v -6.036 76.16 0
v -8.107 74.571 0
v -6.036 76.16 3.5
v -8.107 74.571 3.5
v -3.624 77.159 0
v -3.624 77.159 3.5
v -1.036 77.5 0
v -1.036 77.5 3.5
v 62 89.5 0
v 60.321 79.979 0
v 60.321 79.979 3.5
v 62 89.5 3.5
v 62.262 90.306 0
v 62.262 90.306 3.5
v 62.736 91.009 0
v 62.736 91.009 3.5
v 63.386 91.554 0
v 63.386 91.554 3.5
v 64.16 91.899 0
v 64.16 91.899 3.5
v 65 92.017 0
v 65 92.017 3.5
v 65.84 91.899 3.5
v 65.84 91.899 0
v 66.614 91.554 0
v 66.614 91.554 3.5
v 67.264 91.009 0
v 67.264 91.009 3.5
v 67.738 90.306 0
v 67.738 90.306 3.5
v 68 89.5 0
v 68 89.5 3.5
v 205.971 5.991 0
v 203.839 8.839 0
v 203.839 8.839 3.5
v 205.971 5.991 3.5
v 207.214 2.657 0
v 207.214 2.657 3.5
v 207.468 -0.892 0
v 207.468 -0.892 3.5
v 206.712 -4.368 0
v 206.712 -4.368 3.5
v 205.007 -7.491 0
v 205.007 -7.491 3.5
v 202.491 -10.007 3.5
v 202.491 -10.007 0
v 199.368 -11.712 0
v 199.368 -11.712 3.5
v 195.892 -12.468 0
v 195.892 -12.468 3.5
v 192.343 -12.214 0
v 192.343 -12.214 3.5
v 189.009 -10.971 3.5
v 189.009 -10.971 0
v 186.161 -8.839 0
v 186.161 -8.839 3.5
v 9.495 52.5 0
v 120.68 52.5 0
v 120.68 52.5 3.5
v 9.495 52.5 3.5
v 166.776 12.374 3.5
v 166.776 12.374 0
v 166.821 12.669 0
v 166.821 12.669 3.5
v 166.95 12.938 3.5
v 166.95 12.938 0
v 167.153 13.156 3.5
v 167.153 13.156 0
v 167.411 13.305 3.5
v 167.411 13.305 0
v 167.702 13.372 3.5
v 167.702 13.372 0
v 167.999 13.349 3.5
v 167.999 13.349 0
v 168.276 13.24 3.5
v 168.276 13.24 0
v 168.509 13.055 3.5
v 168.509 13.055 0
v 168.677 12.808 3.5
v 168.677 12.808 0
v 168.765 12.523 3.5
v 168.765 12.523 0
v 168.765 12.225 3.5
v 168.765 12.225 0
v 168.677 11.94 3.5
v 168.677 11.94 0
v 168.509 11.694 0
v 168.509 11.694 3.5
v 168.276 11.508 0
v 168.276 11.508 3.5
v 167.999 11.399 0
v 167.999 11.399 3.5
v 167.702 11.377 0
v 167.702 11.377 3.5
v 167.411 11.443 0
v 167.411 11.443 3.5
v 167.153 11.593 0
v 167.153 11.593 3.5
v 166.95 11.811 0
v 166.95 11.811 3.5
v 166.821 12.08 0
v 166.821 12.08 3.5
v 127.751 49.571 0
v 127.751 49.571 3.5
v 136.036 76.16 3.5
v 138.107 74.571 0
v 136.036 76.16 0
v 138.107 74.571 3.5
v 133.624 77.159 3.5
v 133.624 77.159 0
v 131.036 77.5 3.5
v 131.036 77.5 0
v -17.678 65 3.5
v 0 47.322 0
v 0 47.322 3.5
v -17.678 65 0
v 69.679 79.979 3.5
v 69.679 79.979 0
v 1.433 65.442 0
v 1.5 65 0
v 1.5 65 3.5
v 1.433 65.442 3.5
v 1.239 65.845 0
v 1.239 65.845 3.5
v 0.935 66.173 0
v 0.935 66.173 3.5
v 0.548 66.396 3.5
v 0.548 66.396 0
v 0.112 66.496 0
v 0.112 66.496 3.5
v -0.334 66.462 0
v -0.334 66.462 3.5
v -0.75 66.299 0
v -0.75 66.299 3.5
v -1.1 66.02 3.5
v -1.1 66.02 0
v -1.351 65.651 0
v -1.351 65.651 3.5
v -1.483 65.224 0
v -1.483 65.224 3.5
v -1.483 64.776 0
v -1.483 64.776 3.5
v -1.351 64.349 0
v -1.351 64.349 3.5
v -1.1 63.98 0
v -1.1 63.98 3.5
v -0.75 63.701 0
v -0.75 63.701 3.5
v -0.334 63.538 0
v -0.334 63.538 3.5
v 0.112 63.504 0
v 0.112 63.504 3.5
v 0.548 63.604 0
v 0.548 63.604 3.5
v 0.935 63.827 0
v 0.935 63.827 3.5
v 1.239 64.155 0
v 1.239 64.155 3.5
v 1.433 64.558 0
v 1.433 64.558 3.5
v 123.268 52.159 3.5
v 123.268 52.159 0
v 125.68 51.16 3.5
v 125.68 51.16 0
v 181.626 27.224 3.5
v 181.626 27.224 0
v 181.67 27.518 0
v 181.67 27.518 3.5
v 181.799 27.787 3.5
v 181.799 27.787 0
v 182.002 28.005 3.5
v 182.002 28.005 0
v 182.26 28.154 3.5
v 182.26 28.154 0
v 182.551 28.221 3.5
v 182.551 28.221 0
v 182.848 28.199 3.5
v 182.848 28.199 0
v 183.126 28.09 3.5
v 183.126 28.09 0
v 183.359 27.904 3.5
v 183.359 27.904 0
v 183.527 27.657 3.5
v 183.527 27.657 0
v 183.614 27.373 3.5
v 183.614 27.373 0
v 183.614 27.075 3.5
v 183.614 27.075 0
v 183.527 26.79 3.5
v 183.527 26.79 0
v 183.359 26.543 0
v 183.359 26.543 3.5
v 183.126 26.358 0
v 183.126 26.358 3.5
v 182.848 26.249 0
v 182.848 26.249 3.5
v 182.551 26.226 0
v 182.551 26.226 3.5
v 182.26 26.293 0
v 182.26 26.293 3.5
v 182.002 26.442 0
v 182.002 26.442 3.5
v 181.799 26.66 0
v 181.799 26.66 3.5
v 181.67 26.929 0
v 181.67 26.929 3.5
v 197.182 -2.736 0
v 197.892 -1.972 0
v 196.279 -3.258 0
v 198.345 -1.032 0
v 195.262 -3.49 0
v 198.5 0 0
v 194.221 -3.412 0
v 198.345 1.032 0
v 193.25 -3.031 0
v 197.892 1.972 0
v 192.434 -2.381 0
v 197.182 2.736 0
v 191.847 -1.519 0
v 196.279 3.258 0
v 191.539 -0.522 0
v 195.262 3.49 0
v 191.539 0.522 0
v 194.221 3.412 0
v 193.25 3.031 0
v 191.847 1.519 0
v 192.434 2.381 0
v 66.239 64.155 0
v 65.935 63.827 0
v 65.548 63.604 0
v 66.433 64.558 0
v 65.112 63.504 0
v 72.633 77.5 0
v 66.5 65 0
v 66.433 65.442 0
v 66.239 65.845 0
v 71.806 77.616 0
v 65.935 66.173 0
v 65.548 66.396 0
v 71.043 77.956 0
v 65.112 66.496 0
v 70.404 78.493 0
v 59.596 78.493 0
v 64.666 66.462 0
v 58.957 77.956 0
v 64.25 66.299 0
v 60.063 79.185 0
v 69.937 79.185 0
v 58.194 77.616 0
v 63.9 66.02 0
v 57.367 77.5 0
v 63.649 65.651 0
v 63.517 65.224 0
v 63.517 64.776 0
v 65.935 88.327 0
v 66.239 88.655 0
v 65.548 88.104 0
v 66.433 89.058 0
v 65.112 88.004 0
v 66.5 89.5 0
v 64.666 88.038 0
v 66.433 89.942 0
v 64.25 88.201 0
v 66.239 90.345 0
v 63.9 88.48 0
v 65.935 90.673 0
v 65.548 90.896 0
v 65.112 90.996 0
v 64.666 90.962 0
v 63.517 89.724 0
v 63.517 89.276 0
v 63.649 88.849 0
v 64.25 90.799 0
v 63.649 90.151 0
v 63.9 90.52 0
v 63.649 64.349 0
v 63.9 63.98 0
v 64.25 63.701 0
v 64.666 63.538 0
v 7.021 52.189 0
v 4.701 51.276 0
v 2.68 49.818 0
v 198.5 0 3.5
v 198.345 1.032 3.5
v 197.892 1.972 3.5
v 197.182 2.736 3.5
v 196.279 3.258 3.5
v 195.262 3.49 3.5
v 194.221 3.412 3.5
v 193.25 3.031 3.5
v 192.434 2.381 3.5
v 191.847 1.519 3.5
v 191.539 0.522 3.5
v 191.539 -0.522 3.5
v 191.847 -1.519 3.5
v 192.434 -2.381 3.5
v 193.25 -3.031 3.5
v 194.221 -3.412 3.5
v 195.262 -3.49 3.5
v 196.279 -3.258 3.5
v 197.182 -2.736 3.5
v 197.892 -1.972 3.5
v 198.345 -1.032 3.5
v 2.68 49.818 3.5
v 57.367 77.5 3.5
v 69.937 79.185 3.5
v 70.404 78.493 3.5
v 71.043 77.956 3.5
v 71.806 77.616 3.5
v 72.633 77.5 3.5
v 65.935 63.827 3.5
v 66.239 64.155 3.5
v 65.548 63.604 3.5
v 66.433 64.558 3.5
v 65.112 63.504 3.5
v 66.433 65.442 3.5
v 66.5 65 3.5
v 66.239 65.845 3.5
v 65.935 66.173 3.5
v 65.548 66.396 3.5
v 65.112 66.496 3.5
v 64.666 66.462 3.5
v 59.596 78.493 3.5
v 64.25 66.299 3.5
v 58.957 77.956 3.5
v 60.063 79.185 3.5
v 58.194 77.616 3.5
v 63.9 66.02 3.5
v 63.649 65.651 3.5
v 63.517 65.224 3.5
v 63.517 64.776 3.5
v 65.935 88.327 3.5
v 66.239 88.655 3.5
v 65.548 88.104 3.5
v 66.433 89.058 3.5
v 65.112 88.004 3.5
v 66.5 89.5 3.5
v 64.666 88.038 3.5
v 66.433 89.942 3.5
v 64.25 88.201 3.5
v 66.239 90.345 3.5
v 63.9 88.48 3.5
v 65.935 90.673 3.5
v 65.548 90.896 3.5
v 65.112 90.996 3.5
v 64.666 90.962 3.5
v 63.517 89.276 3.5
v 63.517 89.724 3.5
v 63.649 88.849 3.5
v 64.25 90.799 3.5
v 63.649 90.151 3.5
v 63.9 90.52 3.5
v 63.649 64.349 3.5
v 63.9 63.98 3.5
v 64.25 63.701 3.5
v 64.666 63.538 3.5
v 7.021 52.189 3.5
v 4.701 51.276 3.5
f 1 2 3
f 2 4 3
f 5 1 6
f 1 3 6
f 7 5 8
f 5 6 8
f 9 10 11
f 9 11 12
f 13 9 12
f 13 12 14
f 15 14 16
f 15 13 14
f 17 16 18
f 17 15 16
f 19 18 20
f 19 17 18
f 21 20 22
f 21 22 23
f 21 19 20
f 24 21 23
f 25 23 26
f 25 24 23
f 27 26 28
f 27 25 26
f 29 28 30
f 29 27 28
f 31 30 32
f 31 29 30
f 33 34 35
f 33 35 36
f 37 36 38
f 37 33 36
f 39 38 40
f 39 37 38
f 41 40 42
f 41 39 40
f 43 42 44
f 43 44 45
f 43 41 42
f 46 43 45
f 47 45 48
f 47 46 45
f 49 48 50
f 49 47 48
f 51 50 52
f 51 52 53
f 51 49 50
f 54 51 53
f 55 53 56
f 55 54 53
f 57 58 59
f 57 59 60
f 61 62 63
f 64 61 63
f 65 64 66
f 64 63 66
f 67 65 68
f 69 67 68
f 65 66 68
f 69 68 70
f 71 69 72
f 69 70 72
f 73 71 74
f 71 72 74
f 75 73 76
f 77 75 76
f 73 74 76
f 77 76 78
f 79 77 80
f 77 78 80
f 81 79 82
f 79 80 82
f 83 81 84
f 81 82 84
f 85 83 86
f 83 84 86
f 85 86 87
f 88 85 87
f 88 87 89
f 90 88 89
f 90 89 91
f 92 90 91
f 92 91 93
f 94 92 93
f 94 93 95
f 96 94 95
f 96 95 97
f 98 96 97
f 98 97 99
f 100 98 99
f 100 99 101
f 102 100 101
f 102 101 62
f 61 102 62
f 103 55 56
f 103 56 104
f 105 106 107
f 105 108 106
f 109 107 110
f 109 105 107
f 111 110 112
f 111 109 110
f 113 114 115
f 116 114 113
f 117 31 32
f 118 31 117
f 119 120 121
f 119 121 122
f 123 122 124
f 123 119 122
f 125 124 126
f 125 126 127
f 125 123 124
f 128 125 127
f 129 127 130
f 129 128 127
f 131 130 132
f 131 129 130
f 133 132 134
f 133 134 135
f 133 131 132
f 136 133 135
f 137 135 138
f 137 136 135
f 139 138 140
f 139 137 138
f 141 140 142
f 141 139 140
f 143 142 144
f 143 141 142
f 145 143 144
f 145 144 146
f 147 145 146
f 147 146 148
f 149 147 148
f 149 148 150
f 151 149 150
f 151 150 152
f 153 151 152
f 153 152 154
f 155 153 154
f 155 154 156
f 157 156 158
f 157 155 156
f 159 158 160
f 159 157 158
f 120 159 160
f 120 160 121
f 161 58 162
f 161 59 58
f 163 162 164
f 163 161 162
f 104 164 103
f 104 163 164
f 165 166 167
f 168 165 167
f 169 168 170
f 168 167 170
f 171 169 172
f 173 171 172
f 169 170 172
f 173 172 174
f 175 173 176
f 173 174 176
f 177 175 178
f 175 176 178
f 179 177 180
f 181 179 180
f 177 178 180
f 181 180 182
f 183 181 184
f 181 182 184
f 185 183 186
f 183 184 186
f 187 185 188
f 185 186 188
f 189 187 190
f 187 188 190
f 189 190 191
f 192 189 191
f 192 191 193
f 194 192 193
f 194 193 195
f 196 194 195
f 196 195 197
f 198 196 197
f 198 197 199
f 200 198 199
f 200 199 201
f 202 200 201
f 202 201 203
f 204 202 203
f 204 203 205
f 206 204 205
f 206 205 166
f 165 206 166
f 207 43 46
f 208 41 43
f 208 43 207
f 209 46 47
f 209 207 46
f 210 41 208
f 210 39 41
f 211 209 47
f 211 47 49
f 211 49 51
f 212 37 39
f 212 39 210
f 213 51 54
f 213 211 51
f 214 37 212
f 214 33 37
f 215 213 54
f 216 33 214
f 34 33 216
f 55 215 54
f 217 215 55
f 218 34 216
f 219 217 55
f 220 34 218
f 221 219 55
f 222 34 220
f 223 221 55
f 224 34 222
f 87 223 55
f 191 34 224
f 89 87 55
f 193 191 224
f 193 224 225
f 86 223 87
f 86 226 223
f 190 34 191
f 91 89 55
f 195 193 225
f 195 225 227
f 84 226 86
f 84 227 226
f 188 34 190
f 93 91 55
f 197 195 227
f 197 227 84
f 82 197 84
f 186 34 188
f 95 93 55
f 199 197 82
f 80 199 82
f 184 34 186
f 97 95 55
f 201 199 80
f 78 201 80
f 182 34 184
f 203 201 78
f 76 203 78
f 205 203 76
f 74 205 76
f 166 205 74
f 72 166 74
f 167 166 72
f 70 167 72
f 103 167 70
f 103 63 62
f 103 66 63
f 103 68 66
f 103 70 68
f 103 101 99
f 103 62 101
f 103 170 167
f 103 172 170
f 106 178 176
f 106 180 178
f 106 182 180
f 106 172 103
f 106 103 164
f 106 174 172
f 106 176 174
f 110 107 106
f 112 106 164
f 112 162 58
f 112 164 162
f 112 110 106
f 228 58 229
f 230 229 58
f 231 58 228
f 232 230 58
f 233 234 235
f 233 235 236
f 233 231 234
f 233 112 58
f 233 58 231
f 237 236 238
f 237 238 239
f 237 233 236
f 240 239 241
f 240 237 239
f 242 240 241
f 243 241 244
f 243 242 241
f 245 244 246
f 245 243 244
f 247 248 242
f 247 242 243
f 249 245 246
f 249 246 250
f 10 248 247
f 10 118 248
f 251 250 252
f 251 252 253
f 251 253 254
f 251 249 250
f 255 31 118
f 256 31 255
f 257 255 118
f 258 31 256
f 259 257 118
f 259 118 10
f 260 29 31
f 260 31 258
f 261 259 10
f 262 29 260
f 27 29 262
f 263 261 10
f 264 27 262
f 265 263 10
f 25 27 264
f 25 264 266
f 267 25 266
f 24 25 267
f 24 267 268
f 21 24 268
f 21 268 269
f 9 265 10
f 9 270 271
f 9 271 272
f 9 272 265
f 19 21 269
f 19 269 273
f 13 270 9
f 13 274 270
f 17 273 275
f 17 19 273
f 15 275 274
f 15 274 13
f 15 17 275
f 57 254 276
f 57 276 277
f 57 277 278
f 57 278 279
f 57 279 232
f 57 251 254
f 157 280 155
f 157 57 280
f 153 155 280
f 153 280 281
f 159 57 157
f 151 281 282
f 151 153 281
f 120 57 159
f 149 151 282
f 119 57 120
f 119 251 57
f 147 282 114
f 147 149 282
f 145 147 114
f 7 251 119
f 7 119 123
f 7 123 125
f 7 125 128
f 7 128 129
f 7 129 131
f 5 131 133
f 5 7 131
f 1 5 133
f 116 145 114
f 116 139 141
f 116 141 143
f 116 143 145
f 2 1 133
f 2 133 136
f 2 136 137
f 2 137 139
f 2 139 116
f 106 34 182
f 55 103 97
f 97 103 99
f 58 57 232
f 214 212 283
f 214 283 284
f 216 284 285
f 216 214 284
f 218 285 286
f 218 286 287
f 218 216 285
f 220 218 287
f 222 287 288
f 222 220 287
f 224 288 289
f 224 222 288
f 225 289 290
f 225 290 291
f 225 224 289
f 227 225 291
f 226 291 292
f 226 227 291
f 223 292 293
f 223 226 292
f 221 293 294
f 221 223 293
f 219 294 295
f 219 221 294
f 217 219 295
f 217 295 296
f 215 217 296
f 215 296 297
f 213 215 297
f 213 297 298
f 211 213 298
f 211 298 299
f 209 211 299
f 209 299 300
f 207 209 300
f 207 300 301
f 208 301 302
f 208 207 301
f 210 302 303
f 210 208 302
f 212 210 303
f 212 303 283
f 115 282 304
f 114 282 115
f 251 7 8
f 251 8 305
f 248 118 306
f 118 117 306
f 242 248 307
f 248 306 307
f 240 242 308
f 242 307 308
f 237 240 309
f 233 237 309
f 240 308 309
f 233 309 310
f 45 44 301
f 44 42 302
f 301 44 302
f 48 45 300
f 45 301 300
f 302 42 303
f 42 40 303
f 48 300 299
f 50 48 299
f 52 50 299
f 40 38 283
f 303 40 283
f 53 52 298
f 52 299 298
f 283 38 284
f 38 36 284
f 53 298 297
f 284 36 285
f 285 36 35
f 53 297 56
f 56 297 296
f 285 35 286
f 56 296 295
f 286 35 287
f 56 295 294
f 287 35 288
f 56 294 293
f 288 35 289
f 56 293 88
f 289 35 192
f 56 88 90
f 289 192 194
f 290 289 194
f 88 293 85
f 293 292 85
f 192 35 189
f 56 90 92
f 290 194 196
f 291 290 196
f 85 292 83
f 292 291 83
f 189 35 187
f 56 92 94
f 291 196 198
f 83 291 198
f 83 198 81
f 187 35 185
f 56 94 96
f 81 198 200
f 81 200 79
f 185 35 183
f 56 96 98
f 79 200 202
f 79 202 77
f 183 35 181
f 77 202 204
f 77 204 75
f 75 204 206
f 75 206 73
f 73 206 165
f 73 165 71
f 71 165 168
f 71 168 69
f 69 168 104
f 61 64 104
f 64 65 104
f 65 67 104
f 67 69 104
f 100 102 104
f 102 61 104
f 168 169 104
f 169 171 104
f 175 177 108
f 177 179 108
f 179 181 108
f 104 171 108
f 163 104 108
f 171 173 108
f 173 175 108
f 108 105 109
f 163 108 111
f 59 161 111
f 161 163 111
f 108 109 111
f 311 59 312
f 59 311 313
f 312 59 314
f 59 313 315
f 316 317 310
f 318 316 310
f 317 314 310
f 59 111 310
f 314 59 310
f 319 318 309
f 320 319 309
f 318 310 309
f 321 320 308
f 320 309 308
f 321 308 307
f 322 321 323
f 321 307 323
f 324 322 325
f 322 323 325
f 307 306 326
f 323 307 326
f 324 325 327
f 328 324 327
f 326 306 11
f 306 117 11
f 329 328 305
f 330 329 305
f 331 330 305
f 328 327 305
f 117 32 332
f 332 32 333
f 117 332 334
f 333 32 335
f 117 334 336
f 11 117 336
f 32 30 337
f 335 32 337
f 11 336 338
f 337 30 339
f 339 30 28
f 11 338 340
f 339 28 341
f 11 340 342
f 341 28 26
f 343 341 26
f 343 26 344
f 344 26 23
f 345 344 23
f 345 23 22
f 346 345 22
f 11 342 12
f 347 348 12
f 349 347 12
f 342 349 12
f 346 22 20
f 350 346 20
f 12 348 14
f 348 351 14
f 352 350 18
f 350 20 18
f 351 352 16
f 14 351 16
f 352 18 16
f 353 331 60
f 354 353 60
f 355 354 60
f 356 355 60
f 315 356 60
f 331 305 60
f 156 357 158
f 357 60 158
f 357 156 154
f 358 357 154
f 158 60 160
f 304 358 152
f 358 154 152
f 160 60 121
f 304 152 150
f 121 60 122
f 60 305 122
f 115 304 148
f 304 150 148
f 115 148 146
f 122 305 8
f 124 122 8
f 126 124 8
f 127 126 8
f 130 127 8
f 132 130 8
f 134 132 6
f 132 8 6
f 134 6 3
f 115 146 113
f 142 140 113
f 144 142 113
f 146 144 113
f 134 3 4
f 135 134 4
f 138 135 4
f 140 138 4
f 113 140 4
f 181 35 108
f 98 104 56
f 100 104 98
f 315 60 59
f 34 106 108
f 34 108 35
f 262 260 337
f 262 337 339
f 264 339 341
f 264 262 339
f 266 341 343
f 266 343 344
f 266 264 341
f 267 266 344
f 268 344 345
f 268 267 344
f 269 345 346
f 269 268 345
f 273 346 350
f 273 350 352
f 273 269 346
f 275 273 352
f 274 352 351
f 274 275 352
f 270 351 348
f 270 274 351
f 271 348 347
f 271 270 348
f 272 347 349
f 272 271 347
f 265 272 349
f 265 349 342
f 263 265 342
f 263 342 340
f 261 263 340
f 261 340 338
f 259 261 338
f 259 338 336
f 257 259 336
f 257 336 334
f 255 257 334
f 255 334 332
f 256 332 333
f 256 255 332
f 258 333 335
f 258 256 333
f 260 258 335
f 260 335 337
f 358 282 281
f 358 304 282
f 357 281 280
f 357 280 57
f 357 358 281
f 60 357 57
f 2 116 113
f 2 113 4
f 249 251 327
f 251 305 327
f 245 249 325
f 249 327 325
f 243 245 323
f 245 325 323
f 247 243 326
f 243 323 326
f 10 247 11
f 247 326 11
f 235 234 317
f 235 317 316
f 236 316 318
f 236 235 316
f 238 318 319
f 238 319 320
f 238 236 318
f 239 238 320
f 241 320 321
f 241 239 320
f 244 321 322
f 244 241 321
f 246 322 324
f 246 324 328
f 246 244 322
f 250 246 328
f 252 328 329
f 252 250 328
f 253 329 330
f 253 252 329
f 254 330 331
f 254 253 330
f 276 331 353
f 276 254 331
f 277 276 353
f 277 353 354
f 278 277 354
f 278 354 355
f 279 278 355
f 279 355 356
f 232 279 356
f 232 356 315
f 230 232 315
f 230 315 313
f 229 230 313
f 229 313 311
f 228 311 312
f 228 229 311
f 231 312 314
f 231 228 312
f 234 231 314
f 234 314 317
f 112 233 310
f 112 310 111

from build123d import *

# Parameters (mm, degrees)
SKETCH3_R           = 3.5
SKETCH3_R_2         = 1.5
BOSS_EXTRUDE1_DEPTH = 3.5
FILLET1_R           = 10
FILLET2_R           = 3
SKETCH4_R           = 1
CUT_EXTRUDE1_DEPTH  = 10


with BuildPart() as part:
    # Sketch3 → Boss-Extrude1 (new body)
    with BuildSketch(Plane.XY):
        with BuildLine():
            Line((5.559439508, 52.5), (0, 47.32233047))
            Line((0, 47.32233047), (-17.67766953, 65))
            Line((-17.67766953, 65), (-5.17766953, 77.5))
            Line((-5.17766953, 77.5), (59.884076231, 77.5))
            Line((59.884076231, 77.5), (62, 89.5))
            ThreePointArc((62, 89.5), (65, 92.017298894), (68, 89.5))
            Line((68, 89.5), (70.115923769, 77.5))
            Line((70.115923769, 77.5), (135.17766953, 77.5))
            Line((135.17766953, 77.5), (203.838834765, 8.838834765))
            ThreePointArc((203.838834765, 8.838834765), (203.838834765, -8.838834765), (186.161165235, -8.838834765))
            Line((186.161165235, -8.838834765), (124.82233047, 52.5))
            Line((124.82233047, 52.5), (5.559439508, 52.5))
        make_face()
        with Locations((195, 0)):
            Circle(SKETCH3_R, mode=Mode.SUBTRACT)
        with Locations((0, 65)):
            Circle(SKETCH3_R_2, mode=Mode.SUBTRACT)
        with Locations((65, 65)):
            Circle(SKETCH3_R_2, mode=Mode.SUBTRACT)
        with Locations((65, 89.5)):
            Circle(SKETCH3_R_2, mode=Mode.SUBTRACT)
    extrude(amount=BOSS_EXTRUDE1_DEPTH)

    # Fillet1
    fillet1_edges = [part.edges().sort_by_distance(p)[0] for p in [
        (5.559439508, 52.5, 1.75),
        (-5.17766953, 77.5, 1.75),
        (135.17766953, 77.5, 1.75),
        (124.82233047, 52.5, 1.75),
    ]]
    fillet(fillet1_edges, radius=FILLET1_R)

    # Fillet2
    fillet2_edges = [part.edges().sort_by_distance(p)[0] for p in [
        (59.884076231, 77.5, 1.75),
        (70.115923769, 77.5, 1.75),
    ]]
    fillet(fillet2_edges, radius=FILLET2_R)

    # Sketch4 → Cut-Extrude1 (cut)
    with BuildSketch(Plane(origin=(0, 0, 0), x_dir=(-1, 0, 0), z_dir=(0, 0, -1))):
        with Locations((-167.776388924, 12.374368671)):
            Circle(SKETCH4_R)
        with Locations((-182.625631329, 27.223611076)):
            Circle(SKETCH4_R)
    extrude(amount=-CUT_EXTRUDE1_DEPTH, mode=Mode.SUBTRACT)


solid = part.part
